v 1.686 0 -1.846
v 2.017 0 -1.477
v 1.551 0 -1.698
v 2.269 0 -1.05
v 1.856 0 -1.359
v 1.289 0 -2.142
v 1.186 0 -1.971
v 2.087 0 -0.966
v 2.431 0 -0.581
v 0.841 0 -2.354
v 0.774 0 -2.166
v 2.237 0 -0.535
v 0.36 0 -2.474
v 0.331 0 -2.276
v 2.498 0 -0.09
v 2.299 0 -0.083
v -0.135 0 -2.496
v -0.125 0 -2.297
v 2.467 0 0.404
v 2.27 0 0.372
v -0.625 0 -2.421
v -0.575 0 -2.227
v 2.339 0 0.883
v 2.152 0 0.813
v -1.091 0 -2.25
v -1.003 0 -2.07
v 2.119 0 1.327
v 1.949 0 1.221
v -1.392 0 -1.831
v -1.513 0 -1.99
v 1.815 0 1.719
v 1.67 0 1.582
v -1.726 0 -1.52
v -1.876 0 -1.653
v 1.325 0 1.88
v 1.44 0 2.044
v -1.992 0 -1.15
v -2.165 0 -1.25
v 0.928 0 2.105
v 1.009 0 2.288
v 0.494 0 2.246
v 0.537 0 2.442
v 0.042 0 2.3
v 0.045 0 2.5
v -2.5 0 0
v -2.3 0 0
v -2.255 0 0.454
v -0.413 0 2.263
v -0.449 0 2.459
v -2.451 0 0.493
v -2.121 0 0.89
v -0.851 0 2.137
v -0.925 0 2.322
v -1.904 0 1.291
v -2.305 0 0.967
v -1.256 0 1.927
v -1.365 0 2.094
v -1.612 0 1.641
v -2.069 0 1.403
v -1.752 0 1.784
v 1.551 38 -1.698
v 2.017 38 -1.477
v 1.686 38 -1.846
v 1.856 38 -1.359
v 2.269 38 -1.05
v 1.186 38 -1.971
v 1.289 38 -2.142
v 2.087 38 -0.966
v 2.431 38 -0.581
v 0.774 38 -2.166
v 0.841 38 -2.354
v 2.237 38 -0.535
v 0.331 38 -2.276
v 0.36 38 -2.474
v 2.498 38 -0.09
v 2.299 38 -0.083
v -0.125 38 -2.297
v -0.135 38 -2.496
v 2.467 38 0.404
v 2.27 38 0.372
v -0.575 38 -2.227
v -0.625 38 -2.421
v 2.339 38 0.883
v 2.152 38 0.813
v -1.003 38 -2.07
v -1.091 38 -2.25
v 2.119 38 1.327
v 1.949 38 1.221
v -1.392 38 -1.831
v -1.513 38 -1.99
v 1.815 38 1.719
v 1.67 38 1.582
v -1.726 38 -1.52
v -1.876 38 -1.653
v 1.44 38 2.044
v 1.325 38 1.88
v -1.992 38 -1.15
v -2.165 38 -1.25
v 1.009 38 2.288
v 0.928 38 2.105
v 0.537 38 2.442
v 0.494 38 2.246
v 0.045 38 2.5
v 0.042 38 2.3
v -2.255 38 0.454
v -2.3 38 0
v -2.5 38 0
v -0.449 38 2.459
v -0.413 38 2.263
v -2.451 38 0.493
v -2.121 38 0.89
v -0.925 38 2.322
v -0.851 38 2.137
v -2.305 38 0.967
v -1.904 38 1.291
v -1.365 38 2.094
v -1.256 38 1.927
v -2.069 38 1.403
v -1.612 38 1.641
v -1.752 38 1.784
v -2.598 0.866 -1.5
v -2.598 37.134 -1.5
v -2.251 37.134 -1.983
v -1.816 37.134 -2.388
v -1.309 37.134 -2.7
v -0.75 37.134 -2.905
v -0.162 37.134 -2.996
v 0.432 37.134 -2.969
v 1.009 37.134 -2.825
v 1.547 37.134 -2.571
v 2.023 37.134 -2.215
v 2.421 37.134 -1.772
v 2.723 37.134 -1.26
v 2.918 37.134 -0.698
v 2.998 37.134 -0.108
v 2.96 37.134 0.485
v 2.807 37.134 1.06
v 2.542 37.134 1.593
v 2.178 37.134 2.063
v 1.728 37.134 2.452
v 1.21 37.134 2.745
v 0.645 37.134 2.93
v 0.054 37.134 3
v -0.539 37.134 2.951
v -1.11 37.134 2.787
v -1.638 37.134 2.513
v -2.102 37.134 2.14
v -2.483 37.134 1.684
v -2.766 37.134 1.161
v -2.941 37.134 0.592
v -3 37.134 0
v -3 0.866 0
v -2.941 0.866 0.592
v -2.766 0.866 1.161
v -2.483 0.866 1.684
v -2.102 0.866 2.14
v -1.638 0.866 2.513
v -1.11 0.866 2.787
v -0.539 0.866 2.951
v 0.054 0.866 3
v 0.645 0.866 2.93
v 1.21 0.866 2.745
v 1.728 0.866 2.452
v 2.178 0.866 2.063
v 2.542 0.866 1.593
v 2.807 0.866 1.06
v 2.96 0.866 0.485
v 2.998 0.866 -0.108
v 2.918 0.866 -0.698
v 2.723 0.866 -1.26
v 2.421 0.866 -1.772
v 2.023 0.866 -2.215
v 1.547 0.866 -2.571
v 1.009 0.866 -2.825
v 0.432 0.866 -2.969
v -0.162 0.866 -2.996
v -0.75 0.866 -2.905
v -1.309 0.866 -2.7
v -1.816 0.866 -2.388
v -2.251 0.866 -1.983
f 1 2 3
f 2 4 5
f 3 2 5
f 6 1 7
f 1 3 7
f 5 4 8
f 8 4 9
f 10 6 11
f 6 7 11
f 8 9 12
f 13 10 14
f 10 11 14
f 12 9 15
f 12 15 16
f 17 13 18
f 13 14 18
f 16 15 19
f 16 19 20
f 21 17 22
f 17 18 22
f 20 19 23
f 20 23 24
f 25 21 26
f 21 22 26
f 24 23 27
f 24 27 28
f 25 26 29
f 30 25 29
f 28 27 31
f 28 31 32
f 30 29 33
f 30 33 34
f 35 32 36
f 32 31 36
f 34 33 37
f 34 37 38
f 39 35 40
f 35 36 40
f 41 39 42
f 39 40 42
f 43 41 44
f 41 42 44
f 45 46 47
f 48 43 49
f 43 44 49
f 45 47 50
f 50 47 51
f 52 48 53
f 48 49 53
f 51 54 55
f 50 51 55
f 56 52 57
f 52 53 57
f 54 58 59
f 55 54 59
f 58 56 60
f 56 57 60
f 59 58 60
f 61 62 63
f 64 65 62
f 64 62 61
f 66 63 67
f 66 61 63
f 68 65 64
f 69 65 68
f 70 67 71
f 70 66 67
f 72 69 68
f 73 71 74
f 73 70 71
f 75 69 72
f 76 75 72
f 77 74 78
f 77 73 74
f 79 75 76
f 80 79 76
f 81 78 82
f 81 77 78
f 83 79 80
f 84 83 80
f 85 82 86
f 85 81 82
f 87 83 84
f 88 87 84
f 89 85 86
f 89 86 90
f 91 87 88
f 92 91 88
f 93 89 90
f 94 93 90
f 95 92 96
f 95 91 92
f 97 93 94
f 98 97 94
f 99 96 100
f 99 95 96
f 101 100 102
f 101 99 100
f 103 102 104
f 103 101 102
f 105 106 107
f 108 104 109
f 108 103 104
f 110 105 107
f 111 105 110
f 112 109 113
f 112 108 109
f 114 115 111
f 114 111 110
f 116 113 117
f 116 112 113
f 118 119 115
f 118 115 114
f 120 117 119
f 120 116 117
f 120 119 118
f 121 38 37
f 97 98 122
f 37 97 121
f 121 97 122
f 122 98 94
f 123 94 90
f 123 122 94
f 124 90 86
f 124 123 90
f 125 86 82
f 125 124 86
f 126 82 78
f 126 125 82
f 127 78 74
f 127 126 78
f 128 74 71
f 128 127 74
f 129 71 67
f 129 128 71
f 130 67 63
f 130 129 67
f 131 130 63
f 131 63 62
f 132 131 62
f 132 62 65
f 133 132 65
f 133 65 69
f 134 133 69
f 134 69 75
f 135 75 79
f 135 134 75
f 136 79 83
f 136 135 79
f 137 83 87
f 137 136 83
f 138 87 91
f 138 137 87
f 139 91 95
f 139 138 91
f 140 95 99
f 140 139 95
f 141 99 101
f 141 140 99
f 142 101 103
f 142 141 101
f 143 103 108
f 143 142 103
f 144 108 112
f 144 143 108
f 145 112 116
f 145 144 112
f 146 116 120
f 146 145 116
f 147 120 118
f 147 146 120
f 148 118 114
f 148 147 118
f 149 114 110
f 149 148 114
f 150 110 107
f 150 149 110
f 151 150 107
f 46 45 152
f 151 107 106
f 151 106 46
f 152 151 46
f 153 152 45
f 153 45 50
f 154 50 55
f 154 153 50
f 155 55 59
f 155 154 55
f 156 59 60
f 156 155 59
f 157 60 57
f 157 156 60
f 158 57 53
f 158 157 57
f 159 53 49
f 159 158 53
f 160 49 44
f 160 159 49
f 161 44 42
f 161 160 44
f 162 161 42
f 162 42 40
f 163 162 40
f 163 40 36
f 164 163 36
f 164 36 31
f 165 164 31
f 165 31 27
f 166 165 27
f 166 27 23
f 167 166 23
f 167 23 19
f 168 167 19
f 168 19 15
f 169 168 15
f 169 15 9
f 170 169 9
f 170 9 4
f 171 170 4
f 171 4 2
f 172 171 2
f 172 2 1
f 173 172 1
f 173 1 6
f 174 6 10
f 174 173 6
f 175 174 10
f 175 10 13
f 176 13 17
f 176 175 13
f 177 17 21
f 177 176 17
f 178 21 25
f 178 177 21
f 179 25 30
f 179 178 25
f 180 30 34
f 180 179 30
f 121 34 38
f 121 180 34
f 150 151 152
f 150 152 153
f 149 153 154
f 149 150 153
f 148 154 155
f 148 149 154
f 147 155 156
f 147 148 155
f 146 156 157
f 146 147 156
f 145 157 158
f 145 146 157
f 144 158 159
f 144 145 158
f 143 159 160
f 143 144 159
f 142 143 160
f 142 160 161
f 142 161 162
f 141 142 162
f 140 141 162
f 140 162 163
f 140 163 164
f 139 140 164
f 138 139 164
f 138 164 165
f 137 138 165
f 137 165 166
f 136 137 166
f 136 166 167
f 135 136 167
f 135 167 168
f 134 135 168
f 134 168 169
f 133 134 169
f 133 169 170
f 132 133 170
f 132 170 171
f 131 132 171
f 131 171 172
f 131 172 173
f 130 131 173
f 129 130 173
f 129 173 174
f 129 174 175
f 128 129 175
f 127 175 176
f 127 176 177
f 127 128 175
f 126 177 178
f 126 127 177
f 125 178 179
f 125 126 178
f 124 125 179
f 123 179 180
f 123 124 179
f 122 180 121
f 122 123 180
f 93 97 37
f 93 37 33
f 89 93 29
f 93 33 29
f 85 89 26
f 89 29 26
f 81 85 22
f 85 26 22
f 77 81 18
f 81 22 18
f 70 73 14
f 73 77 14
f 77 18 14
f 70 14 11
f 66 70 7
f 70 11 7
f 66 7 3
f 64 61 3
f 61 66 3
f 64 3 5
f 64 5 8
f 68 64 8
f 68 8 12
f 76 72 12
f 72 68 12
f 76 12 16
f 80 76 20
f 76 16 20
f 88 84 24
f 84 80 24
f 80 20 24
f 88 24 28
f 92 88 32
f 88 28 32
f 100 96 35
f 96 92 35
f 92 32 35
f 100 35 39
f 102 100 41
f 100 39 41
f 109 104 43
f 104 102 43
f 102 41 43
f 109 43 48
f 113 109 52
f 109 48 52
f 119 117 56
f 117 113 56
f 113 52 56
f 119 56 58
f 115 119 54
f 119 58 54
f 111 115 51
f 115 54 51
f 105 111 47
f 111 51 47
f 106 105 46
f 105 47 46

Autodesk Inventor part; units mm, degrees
ref_plane "YZ Plane" through (0, 0, 0) normal (1, 0, 0) x (0, 1, 0)
ref_plane "XZ Plane" through (0, 0, 0) normal (0, 1, 0) x (-1, 0, 0)
ref_plane "XY Plane" through (0, 0, 0) normal (0, 0, 1) x (1, 0, 0)
sketch "Sketch1" plane through (0, 0, 0) normal (0, 0, 1) x (1, 0, 0)
  line L0 (-2.3, 0) -> (-3, 0)
  line L1 (-3, 0) -> (-3, 38)
  line L2 (-3, 38) -> (-2.3, 38)
  line L3 (-2.3, 38) -> (-2.3, 0)
  line L4 (0, 0) -> (0, 38)
  point P0 (-2.65, 38)
  point P1 (-2.65, 0)
  dimension "d0" = 0.7
  dimension "d1" = 6
  dimension "d2" = 38
revolve "Revolution1" add sketch "Sketch1" angle 330 about axis through (0, 0, 0) along (0, 1, 0)
chamfer "Chamfer1" distance 0.5 angle 60 1 edges at (2.8978, 38, 0.7765) measured on face at (-0.4754, 38, -2.7069)
chamfer "Chamfer2" distance 0.5 angle 60 1 edges at (2.8978, 0, 0.7765) measured on face at (1.8107, 0, -2.0675)
